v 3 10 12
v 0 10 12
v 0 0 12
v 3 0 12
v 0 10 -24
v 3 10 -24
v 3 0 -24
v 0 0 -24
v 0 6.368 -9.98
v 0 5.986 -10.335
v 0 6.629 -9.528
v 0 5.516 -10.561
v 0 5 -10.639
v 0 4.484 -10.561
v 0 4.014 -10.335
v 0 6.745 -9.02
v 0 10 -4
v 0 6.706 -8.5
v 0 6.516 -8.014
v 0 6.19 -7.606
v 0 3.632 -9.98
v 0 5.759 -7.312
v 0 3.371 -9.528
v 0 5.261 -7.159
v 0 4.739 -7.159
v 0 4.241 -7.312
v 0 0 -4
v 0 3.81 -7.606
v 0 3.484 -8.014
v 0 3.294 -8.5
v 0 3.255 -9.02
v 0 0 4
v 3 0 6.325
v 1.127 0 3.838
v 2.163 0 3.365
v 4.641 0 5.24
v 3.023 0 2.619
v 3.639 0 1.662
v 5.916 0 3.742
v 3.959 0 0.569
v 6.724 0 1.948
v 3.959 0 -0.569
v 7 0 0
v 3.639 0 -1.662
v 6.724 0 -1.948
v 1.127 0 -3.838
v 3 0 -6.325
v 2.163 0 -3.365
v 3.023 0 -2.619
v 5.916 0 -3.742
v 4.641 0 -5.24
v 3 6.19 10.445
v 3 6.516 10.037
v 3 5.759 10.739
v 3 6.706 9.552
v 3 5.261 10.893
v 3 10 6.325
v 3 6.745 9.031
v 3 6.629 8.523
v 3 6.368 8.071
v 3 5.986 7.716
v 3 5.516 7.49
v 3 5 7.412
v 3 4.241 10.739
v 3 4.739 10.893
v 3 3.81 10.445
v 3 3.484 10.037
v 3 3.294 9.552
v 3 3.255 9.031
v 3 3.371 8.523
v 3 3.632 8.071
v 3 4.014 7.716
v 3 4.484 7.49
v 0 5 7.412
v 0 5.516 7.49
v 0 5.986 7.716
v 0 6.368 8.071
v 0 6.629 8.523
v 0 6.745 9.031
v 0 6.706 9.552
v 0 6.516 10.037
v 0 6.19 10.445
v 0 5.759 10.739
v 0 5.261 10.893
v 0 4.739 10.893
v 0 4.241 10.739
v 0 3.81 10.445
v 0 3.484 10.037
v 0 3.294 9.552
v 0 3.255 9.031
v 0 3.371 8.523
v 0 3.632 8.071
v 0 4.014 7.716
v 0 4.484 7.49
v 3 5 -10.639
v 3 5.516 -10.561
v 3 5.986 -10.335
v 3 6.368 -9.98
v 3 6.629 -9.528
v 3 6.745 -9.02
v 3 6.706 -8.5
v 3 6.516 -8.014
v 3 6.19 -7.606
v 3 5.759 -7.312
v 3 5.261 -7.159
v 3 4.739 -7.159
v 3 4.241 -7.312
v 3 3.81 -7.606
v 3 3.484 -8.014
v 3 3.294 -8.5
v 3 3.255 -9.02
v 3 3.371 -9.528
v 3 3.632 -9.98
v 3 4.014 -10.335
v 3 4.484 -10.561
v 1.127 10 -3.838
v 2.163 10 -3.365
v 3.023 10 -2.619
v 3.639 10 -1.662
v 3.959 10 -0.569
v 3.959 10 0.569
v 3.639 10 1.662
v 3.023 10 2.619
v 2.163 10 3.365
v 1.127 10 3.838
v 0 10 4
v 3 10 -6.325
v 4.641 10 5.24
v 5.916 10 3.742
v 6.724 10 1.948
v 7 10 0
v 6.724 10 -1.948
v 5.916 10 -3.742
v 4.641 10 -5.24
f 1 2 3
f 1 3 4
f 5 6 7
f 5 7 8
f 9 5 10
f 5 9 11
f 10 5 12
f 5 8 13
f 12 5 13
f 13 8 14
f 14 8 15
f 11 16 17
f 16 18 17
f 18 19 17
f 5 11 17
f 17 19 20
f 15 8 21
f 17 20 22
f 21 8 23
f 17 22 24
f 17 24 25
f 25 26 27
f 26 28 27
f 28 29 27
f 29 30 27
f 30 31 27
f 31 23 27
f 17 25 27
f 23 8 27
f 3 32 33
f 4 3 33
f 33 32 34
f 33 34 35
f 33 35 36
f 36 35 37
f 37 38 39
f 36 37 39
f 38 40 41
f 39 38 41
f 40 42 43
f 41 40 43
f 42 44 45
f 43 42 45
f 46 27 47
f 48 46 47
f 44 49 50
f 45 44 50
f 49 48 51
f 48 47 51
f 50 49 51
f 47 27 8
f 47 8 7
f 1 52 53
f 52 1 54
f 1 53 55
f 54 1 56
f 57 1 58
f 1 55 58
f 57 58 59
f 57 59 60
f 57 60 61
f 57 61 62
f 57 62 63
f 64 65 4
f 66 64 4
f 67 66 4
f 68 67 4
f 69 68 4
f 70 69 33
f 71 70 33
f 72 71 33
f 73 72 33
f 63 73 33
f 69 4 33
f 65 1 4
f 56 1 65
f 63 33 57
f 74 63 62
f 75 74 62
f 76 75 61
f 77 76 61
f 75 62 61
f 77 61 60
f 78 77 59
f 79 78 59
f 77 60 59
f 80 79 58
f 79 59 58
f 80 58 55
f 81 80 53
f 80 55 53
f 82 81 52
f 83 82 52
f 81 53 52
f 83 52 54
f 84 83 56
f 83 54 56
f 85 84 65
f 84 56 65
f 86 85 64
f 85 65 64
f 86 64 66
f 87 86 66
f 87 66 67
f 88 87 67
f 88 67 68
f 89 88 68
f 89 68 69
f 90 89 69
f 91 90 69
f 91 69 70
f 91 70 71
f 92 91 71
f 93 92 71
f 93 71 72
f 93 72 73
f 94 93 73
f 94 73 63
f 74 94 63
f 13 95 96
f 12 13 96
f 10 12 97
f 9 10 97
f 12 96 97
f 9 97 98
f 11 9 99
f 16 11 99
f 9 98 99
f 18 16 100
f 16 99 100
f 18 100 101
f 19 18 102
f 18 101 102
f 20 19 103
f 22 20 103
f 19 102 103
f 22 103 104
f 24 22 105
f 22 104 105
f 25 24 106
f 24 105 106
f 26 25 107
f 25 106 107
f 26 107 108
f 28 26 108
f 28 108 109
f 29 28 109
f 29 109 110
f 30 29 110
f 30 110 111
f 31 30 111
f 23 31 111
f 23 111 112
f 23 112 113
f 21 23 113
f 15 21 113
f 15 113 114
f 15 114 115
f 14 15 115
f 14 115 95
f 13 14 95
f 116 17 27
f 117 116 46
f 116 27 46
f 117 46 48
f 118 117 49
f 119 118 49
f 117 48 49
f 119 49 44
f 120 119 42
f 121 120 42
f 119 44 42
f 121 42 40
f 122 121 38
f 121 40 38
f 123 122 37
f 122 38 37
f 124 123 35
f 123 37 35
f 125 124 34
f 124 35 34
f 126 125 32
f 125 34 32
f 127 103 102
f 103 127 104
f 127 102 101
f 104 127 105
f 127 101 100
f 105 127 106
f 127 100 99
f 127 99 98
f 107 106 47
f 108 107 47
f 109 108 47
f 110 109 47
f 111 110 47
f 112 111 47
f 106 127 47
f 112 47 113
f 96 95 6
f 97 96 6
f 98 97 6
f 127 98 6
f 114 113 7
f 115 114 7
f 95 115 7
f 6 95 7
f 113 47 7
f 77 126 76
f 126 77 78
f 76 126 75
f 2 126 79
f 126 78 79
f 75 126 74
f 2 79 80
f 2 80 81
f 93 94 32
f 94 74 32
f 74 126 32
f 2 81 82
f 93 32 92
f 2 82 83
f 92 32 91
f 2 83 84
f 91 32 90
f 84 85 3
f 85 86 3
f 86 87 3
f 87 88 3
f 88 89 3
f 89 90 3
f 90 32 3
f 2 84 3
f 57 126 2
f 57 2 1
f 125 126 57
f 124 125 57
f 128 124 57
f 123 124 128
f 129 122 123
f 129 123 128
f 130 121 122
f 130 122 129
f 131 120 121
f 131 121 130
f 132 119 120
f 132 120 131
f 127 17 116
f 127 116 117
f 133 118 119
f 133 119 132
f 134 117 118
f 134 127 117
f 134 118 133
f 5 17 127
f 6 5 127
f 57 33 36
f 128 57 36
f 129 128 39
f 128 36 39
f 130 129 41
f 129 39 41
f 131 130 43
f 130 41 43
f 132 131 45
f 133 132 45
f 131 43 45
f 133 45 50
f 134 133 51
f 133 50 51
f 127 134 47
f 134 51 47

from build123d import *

# Parameters (mm, degrees)
EXTRUDE_1_DEPTH     = 10
SKETCH_2_R          = 1.75
CUT_EXTRUDE_1_DEPTH = 27.305892876


with BuildPart() as part:
    # 草图1 → 凸台-拉伸1 (new body)
    with BuildSketch(Plane(origin=(0, 0, 0), x_dir=(1, 0, 0), z_dir=(0, 1, 0))):
        with BuildLine():
            Line((0, 24), (0, 4))
            ThreePointArc((0, 4), (4, 0), (0, -4))
            Line((0, -4), (0, -12))
            Line((0, -12), (3, -12))
            Line((3, -12), (3, -6.32455532))
            ThreePointArc((3, -6.32455532), (7, 0), (3, 6.32455532))
            Line((3, 6.32455532), (3, 24))
            Line((3, 24), (0, 24))
        make_face()
    extrude(amount=EXTRUDE_1_DEPTH)

    # 草图2 → 切除-拉伸1 (cut, through all)
    with BuildSketch(Plane(origin=(3, 0, 0), x_dir=(0, 0, -1), z_dir=(1, 0, 0))):
        with Locations((-9.16227766, 5)):
            Circle(SKETCH_2_R)
        with Locations((8.888984546, 5)):
            Circle(SKETCH_2_R)
    extrude(amount=-CUT_EXTRUDE_1_DEPTH, mode=Mode.SUBTRACT)


solid = part.part
